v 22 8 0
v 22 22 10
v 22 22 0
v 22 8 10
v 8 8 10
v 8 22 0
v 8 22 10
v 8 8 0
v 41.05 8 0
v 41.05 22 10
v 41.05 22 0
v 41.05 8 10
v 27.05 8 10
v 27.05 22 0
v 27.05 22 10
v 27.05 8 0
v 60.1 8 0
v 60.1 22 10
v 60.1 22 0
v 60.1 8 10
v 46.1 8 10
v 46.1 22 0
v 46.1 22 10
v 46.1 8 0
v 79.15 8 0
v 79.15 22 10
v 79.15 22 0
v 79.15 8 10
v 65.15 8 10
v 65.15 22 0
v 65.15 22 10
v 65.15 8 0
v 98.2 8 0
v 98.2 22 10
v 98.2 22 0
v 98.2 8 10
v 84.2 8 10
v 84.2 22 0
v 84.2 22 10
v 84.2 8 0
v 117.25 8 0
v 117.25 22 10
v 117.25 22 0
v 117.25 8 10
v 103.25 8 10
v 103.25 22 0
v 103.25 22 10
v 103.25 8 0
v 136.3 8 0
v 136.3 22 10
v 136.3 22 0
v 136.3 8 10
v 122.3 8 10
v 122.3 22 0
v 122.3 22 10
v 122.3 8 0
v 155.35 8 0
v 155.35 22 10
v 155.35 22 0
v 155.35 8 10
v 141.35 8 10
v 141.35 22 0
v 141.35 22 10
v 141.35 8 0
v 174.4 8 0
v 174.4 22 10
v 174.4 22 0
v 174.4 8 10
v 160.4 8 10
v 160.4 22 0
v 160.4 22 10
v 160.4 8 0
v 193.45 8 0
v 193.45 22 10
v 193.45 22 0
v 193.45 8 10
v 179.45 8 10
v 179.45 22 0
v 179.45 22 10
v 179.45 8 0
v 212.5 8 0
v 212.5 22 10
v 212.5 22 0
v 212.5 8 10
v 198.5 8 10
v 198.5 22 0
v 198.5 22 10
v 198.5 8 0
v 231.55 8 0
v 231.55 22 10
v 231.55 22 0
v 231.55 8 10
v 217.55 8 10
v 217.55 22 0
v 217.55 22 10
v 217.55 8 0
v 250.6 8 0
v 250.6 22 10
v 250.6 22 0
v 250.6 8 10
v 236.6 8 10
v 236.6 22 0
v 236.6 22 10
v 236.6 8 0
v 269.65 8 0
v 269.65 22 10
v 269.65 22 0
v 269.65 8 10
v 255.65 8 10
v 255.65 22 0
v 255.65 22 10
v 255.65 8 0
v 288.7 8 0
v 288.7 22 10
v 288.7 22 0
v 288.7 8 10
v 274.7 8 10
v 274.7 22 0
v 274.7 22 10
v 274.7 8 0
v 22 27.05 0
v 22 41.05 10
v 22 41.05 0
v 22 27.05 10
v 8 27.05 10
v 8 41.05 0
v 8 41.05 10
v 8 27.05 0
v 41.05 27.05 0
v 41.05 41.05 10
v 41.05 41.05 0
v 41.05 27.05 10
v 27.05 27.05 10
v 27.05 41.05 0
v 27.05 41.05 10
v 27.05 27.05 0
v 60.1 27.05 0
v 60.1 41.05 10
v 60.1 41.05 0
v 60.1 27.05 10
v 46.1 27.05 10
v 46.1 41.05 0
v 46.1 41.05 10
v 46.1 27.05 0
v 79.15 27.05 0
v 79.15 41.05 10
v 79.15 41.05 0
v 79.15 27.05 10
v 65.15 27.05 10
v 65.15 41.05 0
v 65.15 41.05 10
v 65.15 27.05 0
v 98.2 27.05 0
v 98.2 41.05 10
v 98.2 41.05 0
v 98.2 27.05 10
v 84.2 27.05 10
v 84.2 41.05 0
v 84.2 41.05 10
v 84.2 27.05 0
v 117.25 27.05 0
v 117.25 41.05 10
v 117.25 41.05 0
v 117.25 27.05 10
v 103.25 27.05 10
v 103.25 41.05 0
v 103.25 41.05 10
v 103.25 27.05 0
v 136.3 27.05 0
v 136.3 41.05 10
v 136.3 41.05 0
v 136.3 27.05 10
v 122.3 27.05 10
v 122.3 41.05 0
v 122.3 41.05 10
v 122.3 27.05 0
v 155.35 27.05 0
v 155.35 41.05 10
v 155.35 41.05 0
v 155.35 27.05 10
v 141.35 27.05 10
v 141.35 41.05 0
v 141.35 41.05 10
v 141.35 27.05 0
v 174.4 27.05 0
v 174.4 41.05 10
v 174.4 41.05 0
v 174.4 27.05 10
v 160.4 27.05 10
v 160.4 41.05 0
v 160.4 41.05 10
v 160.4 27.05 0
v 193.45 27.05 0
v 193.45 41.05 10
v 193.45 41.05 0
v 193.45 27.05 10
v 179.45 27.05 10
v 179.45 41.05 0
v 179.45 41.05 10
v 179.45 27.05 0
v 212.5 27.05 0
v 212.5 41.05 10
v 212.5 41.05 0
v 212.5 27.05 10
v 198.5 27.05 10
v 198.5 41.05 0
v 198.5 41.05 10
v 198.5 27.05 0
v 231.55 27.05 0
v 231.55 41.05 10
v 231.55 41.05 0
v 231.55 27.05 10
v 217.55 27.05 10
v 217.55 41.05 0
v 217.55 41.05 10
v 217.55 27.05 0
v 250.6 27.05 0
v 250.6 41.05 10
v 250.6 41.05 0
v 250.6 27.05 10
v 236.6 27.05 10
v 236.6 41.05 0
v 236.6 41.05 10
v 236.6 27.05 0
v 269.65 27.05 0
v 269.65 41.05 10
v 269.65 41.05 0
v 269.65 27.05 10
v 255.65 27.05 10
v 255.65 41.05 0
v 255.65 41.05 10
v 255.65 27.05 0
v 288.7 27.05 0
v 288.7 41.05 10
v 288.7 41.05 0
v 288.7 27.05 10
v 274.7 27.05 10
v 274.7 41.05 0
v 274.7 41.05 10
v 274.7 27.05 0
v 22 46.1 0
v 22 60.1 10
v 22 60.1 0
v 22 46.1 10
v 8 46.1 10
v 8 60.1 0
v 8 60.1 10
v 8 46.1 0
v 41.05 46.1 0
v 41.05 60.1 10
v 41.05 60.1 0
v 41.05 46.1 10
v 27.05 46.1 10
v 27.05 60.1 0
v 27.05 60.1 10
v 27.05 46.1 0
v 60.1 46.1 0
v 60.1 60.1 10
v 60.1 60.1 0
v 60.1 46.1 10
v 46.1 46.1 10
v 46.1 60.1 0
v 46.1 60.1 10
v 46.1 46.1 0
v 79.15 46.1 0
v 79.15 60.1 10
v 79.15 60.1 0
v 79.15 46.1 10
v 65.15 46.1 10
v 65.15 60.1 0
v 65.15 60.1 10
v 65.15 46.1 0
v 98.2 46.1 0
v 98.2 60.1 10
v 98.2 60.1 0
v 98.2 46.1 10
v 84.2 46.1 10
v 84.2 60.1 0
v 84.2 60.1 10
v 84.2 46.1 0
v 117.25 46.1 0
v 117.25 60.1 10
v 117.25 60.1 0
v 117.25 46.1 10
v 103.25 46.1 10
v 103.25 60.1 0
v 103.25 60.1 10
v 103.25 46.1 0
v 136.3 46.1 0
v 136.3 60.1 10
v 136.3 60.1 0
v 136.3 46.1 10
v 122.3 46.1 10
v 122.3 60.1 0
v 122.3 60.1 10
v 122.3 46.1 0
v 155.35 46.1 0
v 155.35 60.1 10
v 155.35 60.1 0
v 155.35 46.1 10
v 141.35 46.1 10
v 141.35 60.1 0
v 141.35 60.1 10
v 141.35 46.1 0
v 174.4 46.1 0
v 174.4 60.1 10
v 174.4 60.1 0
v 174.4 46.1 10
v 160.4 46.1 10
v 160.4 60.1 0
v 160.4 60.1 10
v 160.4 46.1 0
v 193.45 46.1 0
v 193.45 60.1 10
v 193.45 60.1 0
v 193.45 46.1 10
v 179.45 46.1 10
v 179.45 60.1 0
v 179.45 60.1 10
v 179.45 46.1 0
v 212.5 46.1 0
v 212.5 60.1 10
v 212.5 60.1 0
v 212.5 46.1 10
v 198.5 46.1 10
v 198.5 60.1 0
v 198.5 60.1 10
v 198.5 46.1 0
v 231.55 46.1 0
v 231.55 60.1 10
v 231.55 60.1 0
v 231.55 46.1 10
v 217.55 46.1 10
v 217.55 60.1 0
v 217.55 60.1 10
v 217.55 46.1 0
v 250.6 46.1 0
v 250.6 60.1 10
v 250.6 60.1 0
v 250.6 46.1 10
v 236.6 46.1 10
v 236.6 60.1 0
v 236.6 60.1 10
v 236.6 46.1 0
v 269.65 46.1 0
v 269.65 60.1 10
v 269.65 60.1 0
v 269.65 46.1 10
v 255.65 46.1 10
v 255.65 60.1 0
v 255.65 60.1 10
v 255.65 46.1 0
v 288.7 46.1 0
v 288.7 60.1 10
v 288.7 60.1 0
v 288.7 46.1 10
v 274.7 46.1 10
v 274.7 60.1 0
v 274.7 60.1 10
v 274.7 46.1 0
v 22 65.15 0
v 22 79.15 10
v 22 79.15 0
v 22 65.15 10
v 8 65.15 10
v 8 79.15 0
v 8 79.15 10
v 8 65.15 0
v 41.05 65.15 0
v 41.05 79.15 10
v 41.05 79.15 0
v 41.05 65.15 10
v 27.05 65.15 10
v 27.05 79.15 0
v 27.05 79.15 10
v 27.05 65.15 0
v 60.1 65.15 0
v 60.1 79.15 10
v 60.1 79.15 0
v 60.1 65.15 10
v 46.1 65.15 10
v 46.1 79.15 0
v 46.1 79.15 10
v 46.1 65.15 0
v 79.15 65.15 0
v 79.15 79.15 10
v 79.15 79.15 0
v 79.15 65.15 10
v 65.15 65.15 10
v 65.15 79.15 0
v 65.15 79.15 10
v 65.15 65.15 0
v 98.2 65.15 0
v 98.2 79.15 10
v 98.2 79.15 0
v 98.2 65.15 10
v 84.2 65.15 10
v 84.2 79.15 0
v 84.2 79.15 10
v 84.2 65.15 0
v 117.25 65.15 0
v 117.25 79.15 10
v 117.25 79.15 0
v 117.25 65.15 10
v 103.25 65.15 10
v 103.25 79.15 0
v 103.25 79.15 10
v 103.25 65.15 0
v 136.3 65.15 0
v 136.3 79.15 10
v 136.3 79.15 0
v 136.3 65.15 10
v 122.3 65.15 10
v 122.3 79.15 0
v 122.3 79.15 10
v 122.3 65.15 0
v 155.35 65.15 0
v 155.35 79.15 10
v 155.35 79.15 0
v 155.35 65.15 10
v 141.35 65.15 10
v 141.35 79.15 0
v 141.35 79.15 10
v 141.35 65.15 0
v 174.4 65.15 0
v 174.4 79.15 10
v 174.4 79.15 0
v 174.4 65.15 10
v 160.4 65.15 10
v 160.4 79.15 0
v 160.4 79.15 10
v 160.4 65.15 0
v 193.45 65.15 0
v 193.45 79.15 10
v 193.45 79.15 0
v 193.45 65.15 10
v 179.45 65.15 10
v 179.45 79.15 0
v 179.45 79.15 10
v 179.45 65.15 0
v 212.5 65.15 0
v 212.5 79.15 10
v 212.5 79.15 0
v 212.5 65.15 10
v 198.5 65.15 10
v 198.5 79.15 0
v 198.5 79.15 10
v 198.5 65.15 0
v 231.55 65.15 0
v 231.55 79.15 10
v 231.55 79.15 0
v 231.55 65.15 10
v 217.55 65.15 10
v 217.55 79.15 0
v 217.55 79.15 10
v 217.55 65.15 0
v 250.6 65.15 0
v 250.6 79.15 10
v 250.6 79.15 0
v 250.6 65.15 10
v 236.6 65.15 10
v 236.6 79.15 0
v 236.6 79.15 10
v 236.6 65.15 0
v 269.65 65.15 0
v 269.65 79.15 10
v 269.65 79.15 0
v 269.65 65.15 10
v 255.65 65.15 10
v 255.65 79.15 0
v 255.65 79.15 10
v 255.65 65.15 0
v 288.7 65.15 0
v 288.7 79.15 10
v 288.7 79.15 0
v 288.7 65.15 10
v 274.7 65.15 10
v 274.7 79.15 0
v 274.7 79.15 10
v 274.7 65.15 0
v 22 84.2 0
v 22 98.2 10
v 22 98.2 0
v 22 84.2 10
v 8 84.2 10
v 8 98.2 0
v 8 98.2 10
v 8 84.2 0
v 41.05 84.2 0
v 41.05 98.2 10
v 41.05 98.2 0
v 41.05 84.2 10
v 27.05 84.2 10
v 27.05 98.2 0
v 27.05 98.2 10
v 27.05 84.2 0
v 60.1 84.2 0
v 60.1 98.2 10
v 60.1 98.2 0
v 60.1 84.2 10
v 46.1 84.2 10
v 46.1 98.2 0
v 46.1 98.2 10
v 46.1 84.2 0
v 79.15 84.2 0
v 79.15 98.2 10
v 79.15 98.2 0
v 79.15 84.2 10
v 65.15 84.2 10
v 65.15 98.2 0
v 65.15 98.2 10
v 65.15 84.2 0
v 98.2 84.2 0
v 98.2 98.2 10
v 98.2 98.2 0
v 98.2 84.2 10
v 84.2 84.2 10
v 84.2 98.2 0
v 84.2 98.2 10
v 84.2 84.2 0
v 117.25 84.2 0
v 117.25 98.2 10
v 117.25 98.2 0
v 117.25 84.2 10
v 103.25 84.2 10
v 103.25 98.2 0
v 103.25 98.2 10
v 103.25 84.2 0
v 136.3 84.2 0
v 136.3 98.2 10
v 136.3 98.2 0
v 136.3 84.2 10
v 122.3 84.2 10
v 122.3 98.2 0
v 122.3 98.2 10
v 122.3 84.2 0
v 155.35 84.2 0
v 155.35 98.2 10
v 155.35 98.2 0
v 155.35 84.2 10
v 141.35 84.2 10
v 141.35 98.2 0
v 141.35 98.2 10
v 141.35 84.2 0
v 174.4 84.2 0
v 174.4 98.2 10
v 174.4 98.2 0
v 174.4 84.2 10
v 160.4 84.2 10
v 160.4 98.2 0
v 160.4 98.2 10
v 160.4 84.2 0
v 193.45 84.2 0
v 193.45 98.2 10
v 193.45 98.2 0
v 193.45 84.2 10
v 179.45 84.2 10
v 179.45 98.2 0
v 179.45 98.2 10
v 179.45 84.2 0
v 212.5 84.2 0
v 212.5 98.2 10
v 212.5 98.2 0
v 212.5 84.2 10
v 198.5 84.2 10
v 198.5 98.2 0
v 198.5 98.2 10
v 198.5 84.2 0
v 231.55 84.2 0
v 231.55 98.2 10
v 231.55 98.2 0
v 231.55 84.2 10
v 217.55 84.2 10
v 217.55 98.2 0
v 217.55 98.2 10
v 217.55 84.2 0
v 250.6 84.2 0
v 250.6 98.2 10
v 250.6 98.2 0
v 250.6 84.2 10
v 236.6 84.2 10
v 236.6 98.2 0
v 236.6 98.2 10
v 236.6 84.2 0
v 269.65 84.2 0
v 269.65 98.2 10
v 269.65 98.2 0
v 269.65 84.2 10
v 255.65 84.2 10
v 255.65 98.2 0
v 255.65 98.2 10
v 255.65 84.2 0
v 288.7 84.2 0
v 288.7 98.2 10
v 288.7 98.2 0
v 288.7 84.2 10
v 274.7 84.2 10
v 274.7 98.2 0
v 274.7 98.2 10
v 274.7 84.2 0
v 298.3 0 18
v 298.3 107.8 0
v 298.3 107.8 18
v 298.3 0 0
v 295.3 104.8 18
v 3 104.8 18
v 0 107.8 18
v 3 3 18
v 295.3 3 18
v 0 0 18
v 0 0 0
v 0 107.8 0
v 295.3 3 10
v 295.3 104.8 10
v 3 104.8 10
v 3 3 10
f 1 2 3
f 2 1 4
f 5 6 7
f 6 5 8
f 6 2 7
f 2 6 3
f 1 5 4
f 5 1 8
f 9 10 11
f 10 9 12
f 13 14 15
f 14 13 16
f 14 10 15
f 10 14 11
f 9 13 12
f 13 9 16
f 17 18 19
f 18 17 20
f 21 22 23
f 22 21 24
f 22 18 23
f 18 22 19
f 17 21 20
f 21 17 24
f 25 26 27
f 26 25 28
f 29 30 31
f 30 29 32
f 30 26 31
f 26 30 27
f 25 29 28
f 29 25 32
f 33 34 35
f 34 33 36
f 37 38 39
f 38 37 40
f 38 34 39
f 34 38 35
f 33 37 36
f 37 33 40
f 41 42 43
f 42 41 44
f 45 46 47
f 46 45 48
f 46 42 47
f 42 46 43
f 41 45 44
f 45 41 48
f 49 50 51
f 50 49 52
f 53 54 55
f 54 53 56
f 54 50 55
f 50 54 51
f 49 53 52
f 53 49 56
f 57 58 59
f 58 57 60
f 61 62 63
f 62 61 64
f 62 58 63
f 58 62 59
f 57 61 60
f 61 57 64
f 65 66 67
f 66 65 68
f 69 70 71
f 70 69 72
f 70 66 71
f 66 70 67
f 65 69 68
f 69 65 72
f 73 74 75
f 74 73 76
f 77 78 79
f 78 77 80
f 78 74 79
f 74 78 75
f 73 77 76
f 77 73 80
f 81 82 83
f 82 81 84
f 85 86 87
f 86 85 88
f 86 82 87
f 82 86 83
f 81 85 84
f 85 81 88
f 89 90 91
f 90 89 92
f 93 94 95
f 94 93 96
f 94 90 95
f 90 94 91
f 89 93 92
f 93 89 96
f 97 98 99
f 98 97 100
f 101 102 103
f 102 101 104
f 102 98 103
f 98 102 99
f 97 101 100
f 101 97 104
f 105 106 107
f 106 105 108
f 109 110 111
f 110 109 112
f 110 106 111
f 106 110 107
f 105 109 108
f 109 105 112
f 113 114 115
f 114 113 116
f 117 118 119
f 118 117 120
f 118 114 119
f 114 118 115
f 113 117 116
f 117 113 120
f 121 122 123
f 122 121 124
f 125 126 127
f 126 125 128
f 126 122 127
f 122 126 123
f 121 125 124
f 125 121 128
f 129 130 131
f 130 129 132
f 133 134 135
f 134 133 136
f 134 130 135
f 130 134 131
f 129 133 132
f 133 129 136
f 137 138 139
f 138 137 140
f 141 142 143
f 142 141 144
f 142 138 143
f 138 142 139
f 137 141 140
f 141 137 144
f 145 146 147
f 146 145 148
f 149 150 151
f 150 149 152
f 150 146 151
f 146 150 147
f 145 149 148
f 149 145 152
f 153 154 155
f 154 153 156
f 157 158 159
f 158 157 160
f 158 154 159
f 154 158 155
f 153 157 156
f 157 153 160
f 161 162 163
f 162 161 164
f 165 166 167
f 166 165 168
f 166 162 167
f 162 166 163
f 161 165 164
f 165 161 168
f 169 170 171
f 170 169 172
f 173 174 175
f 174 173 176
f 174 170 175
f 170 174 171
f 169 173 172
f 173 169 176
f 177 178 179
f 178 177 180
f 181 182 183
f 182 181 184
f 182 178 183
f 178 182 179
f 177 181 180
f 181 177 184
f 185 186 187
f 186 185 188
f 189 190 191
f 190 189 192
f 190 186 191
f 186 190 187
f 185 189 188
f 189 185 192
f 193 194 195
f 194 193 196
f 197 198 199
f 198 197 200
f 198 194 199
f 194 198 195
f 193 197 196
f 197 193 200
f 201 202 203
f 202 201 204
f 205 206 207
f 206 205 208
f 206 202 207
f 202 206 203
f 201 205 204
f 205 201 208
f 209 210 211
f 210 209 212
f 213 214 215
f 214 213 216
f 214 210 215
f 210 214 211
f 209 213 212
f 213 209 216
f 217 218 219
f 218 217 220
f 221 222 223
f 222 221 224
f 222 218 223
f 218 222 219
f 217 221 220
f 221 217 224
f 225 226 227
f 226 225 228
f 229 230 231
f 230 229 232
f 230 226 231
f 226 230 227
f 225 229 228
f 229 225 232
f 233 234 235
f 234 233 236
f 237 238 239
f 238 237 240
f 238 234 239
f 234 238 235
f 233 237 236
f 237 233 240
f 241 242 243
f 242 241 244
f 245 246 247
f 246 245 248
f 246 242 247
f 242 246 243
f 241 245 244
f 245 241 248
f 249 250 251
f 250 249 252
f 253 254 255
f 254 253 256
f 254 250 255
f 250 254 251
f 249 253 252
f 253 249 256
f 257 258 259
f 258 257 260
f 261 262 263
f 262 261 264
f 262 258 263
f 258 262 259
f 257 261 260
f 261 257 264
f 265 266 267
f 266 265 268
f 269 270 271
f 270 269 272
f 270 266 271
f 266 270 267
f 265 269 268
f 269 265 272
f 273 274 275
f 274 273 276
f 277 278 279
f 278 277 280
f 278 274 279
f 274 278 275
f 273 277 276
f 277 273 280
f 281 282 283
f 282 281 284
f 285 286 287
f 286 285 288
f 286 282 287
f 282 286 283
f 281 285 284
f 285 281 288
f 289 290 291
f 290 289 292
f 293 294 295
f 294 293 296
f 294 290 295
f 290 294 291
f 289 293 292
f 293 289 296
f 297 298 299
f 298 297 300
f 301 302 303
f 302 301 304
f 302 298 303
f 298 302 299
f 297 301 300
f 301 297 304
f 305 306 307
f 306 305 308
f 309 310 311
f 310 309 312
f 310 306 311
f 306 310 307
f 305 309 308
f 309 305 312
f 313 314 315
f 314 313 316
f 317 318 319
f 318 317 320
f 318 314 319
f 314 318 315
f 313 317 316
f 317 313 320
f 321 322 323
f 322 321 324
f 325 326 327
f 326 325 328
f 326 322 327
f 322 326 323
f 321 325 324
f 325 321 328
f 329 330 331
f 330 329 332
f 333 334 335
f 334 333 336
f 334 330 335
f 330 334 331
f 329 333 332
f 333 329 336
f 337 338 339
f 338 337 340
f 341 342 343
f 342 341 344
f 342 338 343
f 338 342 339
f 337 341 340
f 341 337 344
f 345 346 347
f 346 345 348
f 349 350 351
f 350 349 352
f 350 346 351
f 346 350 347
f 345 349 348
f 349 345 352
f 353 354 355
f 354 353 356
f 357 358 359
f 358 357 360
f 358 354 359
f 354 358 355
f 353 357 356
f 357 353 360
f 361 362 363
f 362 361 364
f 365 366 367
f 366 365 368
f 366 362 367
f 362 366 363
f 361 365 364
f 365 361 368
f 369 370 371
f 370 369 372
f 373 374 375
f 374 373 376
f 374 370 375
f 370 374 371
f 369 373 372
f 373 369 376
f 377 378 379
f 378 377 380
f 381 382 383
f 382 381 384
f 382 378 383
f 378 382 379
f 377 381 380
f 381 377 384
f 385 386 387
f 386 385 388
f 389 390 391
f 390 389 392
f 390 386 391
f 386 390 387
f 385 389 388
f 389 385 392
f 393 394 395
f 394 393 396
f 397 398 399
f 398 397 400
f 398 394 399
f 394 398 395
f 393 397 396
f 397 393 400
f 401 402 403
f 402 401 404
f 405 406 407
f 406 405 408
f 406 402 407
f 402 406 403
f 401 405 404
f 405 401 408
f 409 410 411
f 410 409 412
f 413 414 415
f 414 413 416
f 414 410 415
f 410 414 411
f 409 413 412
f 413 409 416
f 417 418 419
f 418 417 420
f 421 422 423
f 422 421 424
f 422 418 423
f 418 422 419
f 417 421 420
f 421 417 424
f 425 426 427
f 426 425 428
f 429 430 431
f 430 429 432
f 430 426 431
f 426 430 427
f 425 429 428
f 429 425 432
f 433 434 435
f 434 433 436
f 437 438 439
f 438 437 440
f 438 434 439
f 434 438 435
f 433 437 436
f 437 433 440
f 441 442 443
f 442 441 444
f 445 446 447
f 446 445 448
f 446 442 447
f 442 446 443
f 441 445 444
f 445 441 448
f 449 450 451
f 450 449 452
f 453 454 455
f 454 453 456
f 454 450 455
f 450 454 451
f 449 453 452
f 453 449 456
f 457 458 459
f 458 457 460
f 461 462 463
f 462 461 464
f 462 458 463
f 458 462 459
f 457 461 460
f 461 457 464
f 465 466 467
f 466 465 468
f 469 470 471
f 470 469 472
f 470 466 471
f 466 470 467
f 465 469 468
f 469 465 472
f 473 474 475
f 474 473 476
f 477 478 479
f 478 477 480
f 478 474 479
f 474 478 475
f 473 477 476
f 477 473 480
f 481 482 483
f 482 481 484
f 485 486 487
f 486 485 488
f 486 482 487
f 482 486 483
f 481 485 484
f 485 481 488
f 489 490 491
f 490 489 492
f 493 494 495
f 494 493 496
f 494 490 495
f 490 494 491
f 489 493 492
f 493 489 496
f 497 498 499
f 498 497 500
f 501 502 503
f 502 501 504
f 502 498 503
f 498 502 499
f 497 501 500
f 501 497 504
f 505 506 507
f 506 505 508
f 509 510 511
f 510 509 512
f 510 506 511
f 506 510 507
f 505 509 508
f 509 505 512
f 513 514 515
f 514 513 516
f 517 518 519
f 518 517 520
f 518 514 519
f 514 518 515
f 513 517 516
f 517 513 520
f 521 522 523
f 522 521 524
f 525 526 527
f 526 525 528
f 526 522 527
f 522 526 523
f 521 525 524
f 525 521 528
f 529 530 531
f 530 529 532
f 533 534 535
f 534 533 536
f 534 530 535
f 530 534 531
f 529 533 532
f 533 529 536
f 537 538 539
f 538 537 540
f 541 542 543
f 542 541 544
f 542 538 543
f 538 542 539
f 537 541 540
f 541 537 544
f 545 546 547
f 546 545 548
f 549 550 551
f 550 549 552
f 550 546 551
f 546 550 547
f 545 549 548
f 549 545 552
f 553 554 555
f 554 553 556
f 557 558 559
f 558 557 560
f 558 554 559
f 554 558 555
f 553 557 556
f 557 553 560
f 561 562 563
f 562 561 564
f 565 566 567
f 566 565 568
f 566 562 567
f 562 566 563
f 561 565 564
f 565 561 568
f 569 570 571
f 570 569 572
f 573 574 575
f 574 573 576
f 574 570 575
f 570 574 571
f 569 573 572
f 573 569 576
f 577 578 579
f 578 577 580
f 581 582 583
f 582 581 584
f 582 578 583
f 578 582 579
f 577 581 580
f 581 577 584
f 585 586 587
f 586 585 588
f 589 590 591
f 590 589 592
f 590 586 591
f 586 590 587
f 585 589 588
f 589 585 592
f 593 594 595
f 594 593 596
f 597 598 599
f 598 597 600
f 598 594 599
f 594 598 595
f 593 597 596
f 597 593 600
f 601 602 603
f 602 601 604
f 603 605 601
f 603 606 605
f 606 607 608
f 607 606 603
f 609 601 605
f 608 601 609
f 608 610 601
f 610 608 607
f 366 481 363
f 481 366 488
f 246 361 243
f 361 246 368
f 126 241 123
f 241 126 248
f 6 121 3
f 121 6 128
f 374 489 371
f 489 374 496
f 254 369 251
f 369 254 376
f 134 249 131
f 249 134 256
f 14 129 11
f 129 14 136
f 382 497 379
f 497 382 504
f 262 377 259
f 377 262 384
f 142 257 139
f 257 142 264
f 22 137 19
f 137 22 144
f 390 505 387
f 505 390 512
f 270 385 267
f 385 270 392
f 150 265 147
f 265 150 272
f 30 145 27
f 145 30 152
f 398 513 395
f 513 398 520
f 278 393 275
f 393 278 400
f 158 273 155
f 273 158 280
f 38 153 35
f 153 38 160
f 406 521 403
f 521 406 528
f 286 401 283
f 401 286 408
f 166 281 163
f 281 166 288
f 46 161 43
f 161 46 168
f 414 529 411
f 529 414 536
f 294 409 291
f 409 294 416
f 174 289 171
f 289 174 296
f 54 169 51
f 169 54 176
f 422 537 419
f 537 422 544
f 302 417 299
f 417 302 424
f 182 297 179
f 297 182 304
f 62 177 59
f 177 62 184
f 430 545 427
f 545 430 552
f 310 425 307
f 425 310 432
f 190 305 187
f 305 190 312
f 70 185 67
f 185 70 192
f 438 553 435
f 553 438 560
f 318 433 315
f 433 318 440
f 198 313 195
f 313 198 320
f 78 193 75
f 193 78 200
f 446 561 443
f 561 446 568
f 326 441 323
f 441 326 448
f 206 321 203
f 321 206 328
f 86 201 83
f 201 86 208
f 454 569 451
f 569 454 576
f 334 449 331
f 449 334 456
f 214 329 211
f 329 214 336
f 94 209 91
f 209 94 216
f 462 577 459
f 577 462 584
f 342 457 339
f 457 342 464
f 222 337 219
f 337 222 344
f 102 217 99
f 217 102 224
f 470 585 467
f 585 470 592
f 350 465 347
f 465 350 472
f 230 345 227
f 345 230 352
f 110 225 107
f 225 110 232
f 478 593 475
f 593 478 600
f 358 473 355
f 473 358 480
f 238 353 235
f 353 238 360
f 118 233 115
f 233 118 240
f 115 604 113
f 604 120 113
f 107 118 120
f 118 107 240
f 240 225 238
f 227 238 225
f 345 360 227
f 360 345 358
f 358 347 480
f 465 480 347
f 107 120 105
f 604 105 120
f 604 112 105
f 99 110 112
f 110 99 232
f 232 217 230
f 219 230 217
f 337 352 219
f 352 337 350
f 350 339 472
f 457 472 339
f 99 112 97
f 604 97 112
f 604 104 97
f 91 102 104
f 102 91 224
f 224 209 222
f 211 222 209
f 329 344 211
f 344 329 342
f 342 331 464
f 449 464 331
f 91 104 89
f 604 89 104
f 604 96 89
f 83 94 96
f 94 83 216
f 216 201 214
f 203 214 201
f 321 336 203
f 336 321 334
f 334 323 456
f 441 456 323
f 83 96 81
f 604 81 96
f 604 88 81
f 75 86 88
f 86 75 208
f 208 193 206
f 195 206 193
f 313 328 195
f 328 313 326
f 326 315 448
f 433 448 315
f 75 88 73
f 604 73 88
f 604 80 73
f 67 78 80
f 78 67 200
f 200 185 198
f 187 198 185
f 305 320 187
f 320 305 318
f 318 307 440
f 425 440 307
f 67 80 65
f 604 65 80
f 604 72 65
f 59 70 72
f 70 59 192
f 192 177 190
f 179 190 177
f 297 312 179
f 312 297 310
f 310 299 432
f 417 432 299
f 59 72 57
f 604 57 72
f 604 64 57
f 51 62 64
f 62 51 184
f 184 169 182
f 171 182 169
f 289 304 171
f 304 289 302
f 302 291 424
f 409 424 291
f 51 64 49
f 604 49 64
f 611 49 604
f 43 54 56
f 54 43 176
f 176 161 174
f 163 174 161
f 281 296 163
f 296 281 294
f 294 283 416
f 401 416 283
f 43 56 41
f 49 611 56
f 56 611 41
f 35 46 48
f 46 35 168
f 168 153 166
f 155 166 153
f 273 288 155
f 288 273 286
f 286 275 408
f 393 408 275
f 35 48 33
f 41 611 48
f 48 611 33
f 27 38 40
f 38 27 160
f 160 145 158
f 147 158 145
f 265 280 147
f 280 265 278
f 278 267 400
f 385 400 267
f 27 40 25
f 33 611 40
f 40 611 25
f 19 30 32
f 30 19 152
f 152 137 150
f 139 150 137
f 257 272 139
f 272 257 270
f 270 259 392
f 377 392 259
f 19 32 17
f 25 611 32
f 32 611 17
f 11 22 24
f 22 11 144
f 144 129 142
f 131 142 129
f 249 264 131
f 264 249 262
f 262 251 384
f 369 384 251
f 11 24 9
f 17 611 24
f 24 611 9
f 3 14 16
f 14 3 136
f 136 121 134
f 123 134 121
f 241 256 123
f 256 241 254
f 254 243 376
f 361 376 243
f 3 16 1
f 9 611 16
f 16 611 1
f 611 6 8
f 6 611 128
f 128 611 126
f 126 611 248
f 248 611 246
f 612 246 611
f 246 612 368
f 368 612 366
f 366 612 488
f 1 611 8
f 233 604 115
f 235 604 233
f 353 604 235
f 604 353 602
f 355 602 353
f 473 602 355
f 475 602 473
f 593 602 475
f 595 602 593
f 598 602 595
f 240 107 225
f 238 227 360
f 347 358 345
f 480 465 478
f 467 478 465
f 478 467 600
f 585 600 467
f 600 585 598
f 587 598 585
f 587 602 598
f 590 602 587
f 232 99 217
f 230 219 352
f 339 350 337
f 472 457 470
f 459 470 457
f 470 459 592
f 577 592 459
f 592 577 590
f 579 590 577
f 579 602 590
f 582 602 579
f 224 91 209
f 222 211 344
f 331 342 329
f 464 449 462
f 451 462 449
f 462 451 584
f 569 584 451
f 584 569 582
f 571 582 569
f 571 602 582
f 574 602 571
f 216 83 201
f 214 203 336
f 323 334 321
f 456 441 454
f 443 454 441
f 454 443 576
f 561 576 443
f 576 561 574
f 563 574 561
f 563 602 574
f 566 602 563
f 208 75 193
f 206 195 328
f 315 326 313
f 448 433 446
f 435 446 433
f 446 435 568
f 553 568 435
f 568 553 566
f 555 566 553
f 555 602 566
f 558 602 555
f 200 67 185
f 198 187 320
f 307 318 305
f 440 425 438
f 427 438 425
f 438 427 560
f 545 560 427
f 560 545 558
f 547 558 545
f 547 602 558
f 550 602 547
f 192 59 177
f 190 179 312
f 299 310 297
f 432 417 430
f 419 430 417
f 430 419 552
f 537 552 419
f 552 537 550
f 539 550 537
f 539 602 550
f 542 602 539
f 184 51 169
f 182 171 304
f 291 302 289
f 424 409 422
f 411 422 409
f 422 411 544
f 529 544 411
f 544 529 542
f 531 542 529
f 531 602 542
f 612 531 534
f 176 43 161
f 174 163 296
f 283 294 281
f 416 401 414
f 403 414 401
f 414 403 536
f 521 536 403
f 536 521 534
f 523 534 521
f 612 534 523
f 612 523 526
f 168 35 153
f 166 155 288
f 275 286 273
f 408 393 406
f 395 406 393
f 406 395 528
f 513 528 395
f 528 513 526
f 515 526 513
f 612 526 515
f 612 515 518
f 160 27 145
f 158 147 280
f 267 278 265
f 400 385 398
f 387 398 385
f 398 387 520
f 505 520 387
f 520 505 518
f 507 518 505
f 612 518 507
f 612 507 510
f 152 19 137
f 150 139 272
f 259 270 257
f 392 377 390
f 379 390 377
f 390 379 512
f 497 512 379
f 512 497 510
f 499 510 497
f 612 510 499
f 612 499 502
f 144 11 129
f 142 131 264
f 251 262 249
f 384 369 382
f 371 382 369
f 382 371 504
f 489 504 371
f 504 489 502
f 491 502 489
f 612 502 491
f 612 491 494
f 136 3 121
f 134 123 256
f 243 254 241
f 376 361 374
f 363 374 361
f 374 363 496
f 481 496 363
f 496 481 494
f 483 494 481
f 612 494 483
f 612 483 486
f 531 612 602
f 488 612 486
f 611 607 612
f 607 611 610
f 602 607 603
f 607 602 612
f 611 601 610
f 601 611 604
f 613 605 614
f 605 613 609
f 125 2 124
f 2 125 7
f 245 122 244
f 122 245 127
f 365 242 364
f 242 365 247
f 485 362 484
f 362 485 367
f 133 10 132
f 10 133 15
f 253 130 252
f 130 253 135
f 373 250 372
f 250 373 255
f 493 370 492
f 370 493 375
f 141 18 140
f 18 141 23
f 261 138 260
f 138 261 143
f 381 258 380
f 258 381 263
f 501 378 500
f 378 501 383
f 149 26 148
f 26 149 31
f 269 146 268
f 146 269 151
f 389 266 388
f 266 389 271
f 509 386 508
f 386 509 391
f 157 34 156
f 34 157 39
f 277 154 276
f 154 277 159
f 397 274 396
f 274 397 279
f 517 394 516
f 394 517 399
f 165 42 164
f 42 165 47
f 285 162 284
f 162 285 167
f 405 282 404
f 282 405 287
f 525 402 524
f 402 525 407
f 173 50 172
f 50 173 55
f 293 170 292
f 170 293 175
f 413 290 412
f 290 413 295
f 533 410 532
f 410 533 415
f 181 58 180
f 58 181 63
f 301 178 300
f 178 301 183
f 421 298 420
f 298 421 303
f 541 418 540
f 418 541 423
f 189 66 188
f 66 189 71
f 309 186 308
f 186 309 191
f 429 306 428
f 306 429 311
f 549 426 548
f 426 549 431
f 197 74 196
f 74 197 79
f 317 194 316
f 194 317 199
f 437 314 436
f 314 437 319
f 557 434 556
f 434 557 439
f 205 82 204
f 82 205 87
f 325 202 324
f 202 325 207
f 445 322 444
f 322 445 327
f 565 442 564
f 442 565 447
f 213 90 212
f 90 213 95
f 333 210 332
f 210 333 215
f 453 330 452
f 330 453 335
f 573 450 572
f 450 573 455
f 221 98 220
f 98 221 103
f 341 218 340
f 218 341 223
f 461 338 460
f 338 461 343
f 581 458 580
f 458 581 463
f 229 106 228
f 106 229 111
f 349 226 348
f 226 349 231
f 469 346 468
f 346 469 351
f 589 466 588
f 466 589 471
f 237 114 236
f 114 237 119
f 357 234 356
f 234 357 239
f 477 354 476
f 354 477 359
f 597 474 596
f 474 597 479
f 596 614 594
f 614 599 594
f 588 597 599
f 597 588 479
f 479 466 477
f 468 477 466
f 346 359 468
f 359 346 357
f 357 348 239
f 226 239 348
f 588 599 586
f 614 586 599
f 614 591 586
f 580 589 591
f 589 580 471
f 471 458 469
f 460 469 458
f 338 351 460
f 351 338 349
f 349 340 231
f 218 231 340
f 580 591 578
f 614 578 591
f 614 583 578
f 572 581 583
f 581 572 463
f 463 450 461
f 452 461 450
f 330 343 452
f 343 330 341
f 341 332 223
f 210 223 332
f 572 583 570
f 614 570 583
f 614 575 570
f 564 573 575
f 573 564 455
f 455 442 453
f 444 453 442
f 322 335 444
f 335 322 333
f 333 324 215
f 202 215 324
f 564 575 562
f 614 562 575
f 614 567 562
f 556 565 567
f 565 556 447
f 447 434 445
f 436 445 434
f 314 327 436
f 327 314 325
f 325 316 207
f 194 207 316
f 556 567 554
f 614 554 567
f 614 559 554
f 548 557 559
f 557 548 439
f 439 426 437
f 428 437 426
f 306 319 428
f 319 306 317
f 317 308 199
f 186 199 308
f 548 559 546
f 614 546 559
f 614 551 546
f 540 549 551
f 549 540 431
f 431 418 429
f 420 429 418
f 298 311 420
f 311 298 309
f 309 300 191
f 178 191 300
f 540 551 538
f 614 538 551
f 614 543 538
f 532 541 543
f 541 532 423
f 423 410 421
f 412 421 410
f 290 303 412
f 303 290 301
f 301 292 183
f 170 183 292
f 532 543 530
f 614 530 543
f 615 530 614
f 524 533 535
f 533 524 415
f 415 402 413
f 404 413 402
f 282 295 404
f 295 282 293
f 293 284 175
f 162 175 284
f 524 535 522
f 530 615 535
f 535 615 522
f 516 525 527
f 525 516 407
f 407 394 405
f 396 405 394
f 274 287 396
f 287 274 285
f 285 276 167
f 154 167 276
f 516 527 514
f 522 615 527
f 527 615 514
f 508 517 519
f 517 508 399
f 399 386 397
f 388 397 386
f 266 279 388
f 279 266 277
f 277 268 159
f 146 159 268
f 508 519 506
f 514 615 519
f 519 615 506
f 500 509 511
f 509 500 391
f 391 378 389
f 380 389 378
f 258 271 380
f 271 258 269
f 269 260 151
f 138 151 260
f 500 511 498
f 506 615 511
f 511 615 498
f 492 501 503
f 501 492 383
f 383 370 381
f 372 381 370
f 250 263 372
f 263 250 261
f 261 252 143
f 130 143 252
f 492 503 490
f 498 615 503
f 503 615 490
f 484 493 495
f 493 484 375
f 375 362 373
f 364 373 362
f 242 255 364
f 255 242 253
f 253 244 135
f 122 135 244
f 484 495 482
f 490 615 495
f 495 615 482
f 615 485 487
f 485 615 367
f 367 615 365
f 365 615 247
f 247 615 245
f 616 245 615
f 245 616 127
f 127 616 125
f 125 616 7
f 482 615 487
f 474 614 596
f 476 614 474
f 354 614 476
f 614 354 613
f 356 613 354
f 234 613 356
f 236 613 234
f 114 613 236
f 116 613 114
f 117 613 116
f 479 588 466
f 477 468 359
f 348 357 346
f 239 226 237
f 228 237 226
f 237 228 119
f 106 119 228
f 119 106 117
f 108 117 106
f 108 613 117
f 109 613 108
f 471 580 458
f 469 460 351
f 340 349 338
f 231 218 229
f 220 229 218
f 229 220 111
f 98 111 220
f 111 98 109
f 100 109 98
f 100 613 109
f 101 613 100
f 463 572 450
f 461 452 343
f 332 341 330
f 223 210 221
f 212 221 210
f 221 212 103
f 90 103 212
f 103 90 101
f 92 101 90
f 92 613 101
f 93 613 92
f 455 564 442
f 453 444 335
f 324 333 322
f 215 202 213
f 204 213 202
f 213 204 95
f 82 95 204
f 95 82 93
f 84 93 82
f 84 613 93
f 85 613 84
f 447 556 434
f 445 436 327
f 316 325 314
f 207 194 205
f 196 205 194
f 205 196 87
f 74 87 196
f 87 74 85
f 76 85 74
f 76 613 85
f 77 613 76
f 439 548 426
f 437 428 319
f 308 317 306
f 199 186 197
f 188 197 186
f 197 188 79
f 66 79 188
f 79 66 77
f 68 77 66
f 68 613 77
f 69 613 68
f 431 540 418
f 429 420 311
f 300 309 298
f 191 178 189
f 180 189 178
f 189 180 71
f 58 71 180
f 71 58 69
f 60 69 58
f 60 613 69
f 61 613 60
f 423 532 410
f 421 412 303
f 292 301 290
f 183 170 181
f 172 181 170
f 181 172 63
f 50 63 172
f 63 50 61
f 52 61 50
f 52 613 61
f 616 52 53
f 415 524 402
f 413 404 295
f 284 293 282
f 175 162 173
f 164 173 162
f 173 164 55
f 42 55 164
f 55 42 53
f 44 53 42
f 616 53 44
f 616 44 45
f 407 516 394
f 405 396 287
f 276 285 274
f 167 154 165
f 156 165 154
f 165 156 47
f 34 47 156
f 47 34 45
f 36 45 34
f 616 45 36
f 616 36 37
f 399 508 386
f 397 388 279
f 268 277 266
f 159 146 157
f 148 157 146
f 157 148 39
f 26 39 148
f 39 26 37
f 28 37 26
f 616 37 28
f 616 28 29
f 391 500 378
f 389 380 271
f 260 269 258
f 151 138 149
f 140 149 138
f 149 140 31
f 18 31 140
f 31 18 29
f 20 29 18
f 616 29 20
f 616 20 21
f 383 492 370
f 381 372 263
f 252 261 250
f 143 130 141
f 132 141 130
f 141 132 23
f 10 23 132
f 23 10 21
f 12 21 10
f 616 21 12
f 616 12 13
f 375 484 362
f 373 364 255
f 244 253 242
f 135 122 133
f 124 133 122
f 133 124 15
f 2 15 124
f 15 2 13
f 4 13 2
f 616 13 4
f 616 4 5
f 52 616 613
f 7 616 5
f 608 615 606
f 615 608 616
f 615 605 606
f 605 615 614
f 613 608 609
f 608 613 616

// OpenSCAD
// Generated keyboard case
// Layout: 5x15
// Switch type: Cherry MX

// Parameters
case_width = 298.30;
case_height = 107.80;
case_depth = 18.00;
wall_thickness = 3.00;
base_height = 10.00;
switch_cutout_size = 14.00;
key_spacing = 19.05;

module keyboard_case() {
    difference() {
        // Outer shell
        translate([0, 0, 0])
            cube([case_width, case_height, case_depth]);

        // Inner cavity
        translate([wall_thickness, wall_thickness, base_height])
            cube([case_width - 2*wall_thickness, 
                  case_height - 2*wall_thickness, 
                  case_depth - base_height + 1]);

        // Switch cutouts
        translate([wall_thickness + 5, wall_thickness + 5, -1])
            switch_plate();
    }
}

module switch_plate() {
    for (row = [0:4]) {
        for (col = [0:14]) {
            translate([col * key_spacing, row * key_spacing, 0])
                cube([switch_cutout_size, switch_cutout_size, base_height + 2]);
        }
    }
}

// Generate the case
keyboard_case();
